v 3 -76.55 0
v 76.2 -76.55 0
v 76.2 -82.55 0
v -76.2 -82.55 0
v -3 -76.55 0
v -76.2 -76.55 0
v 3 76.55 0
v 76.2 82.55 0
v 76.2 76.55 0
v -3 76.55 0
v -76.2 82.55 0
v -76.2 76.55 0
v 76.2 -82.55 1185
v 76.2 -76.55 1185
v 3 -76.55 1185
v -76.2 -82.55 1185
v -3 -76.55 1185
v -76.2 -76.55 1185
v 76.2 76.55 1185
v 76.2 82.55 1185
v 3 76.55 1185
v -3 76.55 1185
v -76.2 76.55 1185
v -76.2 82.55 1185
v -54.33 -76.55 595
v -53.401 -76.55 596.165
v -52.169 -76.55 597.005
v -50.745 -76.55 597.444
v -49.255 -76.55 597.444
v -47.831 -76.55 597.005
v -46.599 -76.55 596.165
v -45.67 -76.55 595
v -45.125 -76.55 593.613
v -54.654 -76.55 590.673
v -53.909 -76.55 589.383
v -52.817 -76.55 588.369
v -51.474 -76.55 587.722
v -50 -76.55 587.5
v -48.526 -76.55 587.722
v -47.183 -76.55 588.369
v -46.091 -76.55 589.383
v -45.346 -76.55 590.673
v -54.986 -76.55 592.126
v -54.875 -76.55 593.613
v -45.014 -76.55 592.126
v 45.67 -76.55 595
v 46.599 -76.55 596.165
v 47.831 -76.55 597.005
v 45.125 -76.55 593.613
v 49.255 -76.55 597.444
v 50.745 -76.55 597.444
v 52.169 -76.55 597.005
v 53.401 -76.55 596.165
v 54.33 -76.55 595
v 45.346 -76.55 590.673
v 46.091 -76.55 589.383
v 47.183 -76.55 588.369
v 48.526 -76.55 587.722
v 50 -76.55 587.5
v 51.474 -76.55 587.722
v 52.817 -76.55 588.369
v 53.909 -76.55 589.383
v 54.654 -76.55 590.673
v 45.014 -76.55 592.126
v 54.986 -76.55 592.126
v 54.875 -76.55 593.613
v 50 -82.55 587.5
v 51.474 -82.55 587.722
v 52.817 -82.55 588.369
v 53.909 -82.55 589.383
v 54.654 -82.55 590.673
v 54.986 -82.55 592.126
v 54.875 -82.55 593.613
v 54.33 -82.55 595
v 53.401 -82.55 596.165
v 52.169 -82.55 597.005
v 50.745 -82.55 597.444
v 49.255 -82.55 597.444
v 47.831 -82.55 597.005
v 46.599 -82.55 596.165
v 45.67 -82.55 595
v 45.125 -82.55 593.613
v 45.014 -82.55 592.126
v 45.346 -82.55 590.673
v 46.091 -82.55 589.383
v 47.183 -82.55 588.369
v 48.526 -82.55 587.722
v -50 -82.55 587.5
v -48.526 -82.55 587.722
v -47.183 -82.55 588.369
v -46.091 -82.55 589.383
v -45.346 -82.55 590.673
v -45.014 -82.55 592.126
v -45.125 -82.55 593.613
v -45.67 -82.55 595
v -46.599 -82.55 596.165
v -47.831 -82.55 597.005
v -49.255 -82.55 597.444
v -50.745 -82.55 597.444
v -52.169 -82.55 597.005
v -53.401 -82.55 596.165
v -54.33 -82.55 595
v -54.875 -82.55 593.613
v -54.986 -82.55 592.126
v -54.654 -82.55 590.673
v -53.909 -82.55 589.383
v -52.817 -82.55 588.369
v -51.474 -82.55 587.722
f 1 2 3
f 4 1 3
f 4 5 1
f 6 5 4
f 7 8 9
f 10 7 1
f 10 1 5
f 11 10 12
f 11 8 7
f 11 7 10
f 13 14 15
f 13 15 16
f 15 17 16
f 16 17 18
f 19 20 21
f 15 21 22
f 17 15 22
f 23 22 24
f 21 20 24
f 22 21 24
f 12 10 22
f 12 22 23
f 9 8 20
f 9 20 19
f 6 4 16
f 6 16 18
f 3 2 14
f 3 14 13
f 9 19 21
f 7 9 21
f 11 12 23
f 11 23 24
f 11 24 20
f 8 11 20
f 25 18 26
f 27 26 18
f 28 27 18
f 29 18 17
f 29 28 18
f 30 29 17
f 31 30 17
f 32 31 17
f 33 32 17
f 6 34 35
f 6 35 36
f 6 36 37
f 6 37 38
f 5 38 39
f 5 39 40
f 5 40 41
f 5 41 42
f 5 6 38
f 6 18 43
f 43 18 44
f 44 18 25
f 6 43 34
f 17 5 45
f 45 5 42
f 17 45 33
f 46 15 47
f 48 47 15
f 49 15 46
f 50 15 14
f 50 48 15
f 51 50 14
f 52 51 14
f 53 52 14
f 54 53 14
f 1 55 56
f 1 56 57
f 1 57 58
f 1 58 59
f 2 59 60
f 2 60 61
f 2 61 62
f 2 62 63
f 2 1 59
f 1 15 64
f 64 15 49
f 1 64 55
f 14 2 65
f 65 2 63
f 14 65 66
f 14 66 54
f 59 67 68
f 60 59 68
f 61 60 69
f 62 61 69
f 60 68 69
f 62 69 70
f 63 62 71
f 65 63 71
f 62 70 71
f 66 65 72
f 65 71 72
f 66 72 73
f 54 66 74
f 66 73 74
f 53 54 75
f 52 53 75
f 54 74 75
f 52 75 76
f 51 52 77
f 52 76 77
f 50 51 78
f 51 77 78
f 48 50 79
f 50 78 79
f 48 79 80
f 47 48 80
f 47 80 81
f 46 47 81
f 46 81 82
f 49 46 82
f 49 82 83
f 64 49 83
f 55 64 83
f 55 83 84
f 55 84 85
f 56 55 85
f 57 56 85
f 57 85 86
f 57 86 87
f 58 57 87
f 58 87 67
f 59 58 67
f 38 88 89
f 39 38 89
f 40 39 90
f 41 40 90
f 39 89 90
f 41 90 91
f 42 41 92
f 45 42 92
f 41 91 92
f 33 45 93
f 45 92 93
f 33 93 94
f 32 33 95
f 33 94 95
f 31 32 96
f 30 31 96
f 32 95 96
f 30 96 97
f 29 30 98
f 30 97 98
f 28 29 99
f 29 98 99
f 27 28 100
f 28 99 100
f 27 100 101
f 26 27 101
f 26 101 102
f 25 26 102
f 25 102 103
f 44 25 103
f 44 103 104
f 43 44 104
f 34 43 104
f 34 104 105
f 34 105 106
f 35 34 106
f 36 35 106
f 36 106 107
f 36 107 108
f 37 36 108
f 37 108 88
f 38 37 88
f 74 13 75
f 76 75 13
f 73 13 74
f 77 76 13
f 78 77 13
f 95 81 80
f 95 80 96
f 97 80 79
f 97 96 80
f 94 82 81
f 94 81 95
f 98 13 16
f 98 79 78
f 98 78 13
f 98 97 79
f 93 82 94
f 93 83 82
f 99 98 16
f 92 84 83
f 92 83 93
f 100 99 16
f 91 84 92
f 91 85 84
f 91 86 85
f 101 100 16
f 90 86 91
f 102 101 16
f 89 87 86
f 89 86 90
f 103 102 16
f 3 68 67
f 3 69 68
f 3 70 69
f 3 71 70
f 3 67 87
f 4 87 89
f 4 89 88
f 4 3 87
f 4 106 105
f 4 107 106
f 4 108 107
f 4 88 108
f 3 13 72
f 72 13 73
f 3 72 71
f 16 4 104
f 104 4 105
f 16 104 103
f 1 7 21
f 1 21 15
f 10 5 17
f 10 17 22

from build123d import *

# Parameters (mm, degrees)
BOSS_EXTRUDE1_DEPTH = 1185
SKETCH3_R           = 5
CUT_EXTRUDE2_DEPTH  = 20


with BuildPart() as part:
    # Sketch1 → Boss-Extrude1 (new body)
    with BuildSketch(Plane.XY):
        Polygon((76.2, 82.55), (-76.2, 82.55), (-76.2, 76.55), (-3, 76.55), (-3, -76.55), (-76.2, -76.55), (-76.2, -82.55), (76.2, -82.55), (76.2, -76.55), (3, -76.55), (3, 76.55), (76.2, 76.55), align=None)
    extrude(amount=BOSS_EXTRUDE1_DEPTH)

    # Sketch3 → Cut-Extrude2 (cut)
    with BuildSketch(Plane.XZ.offset(82.55)):
        with Locations((-50, 592.5)):
            Circle(SKETCH3_R)
        with Locations((50, 592.5)):
            Circle(SKETCH3_R)
    extrude(amount=-CUT_EXTRUDE2_DEPTH, mode=Mode.SUBTRACT)


solid = part.part
